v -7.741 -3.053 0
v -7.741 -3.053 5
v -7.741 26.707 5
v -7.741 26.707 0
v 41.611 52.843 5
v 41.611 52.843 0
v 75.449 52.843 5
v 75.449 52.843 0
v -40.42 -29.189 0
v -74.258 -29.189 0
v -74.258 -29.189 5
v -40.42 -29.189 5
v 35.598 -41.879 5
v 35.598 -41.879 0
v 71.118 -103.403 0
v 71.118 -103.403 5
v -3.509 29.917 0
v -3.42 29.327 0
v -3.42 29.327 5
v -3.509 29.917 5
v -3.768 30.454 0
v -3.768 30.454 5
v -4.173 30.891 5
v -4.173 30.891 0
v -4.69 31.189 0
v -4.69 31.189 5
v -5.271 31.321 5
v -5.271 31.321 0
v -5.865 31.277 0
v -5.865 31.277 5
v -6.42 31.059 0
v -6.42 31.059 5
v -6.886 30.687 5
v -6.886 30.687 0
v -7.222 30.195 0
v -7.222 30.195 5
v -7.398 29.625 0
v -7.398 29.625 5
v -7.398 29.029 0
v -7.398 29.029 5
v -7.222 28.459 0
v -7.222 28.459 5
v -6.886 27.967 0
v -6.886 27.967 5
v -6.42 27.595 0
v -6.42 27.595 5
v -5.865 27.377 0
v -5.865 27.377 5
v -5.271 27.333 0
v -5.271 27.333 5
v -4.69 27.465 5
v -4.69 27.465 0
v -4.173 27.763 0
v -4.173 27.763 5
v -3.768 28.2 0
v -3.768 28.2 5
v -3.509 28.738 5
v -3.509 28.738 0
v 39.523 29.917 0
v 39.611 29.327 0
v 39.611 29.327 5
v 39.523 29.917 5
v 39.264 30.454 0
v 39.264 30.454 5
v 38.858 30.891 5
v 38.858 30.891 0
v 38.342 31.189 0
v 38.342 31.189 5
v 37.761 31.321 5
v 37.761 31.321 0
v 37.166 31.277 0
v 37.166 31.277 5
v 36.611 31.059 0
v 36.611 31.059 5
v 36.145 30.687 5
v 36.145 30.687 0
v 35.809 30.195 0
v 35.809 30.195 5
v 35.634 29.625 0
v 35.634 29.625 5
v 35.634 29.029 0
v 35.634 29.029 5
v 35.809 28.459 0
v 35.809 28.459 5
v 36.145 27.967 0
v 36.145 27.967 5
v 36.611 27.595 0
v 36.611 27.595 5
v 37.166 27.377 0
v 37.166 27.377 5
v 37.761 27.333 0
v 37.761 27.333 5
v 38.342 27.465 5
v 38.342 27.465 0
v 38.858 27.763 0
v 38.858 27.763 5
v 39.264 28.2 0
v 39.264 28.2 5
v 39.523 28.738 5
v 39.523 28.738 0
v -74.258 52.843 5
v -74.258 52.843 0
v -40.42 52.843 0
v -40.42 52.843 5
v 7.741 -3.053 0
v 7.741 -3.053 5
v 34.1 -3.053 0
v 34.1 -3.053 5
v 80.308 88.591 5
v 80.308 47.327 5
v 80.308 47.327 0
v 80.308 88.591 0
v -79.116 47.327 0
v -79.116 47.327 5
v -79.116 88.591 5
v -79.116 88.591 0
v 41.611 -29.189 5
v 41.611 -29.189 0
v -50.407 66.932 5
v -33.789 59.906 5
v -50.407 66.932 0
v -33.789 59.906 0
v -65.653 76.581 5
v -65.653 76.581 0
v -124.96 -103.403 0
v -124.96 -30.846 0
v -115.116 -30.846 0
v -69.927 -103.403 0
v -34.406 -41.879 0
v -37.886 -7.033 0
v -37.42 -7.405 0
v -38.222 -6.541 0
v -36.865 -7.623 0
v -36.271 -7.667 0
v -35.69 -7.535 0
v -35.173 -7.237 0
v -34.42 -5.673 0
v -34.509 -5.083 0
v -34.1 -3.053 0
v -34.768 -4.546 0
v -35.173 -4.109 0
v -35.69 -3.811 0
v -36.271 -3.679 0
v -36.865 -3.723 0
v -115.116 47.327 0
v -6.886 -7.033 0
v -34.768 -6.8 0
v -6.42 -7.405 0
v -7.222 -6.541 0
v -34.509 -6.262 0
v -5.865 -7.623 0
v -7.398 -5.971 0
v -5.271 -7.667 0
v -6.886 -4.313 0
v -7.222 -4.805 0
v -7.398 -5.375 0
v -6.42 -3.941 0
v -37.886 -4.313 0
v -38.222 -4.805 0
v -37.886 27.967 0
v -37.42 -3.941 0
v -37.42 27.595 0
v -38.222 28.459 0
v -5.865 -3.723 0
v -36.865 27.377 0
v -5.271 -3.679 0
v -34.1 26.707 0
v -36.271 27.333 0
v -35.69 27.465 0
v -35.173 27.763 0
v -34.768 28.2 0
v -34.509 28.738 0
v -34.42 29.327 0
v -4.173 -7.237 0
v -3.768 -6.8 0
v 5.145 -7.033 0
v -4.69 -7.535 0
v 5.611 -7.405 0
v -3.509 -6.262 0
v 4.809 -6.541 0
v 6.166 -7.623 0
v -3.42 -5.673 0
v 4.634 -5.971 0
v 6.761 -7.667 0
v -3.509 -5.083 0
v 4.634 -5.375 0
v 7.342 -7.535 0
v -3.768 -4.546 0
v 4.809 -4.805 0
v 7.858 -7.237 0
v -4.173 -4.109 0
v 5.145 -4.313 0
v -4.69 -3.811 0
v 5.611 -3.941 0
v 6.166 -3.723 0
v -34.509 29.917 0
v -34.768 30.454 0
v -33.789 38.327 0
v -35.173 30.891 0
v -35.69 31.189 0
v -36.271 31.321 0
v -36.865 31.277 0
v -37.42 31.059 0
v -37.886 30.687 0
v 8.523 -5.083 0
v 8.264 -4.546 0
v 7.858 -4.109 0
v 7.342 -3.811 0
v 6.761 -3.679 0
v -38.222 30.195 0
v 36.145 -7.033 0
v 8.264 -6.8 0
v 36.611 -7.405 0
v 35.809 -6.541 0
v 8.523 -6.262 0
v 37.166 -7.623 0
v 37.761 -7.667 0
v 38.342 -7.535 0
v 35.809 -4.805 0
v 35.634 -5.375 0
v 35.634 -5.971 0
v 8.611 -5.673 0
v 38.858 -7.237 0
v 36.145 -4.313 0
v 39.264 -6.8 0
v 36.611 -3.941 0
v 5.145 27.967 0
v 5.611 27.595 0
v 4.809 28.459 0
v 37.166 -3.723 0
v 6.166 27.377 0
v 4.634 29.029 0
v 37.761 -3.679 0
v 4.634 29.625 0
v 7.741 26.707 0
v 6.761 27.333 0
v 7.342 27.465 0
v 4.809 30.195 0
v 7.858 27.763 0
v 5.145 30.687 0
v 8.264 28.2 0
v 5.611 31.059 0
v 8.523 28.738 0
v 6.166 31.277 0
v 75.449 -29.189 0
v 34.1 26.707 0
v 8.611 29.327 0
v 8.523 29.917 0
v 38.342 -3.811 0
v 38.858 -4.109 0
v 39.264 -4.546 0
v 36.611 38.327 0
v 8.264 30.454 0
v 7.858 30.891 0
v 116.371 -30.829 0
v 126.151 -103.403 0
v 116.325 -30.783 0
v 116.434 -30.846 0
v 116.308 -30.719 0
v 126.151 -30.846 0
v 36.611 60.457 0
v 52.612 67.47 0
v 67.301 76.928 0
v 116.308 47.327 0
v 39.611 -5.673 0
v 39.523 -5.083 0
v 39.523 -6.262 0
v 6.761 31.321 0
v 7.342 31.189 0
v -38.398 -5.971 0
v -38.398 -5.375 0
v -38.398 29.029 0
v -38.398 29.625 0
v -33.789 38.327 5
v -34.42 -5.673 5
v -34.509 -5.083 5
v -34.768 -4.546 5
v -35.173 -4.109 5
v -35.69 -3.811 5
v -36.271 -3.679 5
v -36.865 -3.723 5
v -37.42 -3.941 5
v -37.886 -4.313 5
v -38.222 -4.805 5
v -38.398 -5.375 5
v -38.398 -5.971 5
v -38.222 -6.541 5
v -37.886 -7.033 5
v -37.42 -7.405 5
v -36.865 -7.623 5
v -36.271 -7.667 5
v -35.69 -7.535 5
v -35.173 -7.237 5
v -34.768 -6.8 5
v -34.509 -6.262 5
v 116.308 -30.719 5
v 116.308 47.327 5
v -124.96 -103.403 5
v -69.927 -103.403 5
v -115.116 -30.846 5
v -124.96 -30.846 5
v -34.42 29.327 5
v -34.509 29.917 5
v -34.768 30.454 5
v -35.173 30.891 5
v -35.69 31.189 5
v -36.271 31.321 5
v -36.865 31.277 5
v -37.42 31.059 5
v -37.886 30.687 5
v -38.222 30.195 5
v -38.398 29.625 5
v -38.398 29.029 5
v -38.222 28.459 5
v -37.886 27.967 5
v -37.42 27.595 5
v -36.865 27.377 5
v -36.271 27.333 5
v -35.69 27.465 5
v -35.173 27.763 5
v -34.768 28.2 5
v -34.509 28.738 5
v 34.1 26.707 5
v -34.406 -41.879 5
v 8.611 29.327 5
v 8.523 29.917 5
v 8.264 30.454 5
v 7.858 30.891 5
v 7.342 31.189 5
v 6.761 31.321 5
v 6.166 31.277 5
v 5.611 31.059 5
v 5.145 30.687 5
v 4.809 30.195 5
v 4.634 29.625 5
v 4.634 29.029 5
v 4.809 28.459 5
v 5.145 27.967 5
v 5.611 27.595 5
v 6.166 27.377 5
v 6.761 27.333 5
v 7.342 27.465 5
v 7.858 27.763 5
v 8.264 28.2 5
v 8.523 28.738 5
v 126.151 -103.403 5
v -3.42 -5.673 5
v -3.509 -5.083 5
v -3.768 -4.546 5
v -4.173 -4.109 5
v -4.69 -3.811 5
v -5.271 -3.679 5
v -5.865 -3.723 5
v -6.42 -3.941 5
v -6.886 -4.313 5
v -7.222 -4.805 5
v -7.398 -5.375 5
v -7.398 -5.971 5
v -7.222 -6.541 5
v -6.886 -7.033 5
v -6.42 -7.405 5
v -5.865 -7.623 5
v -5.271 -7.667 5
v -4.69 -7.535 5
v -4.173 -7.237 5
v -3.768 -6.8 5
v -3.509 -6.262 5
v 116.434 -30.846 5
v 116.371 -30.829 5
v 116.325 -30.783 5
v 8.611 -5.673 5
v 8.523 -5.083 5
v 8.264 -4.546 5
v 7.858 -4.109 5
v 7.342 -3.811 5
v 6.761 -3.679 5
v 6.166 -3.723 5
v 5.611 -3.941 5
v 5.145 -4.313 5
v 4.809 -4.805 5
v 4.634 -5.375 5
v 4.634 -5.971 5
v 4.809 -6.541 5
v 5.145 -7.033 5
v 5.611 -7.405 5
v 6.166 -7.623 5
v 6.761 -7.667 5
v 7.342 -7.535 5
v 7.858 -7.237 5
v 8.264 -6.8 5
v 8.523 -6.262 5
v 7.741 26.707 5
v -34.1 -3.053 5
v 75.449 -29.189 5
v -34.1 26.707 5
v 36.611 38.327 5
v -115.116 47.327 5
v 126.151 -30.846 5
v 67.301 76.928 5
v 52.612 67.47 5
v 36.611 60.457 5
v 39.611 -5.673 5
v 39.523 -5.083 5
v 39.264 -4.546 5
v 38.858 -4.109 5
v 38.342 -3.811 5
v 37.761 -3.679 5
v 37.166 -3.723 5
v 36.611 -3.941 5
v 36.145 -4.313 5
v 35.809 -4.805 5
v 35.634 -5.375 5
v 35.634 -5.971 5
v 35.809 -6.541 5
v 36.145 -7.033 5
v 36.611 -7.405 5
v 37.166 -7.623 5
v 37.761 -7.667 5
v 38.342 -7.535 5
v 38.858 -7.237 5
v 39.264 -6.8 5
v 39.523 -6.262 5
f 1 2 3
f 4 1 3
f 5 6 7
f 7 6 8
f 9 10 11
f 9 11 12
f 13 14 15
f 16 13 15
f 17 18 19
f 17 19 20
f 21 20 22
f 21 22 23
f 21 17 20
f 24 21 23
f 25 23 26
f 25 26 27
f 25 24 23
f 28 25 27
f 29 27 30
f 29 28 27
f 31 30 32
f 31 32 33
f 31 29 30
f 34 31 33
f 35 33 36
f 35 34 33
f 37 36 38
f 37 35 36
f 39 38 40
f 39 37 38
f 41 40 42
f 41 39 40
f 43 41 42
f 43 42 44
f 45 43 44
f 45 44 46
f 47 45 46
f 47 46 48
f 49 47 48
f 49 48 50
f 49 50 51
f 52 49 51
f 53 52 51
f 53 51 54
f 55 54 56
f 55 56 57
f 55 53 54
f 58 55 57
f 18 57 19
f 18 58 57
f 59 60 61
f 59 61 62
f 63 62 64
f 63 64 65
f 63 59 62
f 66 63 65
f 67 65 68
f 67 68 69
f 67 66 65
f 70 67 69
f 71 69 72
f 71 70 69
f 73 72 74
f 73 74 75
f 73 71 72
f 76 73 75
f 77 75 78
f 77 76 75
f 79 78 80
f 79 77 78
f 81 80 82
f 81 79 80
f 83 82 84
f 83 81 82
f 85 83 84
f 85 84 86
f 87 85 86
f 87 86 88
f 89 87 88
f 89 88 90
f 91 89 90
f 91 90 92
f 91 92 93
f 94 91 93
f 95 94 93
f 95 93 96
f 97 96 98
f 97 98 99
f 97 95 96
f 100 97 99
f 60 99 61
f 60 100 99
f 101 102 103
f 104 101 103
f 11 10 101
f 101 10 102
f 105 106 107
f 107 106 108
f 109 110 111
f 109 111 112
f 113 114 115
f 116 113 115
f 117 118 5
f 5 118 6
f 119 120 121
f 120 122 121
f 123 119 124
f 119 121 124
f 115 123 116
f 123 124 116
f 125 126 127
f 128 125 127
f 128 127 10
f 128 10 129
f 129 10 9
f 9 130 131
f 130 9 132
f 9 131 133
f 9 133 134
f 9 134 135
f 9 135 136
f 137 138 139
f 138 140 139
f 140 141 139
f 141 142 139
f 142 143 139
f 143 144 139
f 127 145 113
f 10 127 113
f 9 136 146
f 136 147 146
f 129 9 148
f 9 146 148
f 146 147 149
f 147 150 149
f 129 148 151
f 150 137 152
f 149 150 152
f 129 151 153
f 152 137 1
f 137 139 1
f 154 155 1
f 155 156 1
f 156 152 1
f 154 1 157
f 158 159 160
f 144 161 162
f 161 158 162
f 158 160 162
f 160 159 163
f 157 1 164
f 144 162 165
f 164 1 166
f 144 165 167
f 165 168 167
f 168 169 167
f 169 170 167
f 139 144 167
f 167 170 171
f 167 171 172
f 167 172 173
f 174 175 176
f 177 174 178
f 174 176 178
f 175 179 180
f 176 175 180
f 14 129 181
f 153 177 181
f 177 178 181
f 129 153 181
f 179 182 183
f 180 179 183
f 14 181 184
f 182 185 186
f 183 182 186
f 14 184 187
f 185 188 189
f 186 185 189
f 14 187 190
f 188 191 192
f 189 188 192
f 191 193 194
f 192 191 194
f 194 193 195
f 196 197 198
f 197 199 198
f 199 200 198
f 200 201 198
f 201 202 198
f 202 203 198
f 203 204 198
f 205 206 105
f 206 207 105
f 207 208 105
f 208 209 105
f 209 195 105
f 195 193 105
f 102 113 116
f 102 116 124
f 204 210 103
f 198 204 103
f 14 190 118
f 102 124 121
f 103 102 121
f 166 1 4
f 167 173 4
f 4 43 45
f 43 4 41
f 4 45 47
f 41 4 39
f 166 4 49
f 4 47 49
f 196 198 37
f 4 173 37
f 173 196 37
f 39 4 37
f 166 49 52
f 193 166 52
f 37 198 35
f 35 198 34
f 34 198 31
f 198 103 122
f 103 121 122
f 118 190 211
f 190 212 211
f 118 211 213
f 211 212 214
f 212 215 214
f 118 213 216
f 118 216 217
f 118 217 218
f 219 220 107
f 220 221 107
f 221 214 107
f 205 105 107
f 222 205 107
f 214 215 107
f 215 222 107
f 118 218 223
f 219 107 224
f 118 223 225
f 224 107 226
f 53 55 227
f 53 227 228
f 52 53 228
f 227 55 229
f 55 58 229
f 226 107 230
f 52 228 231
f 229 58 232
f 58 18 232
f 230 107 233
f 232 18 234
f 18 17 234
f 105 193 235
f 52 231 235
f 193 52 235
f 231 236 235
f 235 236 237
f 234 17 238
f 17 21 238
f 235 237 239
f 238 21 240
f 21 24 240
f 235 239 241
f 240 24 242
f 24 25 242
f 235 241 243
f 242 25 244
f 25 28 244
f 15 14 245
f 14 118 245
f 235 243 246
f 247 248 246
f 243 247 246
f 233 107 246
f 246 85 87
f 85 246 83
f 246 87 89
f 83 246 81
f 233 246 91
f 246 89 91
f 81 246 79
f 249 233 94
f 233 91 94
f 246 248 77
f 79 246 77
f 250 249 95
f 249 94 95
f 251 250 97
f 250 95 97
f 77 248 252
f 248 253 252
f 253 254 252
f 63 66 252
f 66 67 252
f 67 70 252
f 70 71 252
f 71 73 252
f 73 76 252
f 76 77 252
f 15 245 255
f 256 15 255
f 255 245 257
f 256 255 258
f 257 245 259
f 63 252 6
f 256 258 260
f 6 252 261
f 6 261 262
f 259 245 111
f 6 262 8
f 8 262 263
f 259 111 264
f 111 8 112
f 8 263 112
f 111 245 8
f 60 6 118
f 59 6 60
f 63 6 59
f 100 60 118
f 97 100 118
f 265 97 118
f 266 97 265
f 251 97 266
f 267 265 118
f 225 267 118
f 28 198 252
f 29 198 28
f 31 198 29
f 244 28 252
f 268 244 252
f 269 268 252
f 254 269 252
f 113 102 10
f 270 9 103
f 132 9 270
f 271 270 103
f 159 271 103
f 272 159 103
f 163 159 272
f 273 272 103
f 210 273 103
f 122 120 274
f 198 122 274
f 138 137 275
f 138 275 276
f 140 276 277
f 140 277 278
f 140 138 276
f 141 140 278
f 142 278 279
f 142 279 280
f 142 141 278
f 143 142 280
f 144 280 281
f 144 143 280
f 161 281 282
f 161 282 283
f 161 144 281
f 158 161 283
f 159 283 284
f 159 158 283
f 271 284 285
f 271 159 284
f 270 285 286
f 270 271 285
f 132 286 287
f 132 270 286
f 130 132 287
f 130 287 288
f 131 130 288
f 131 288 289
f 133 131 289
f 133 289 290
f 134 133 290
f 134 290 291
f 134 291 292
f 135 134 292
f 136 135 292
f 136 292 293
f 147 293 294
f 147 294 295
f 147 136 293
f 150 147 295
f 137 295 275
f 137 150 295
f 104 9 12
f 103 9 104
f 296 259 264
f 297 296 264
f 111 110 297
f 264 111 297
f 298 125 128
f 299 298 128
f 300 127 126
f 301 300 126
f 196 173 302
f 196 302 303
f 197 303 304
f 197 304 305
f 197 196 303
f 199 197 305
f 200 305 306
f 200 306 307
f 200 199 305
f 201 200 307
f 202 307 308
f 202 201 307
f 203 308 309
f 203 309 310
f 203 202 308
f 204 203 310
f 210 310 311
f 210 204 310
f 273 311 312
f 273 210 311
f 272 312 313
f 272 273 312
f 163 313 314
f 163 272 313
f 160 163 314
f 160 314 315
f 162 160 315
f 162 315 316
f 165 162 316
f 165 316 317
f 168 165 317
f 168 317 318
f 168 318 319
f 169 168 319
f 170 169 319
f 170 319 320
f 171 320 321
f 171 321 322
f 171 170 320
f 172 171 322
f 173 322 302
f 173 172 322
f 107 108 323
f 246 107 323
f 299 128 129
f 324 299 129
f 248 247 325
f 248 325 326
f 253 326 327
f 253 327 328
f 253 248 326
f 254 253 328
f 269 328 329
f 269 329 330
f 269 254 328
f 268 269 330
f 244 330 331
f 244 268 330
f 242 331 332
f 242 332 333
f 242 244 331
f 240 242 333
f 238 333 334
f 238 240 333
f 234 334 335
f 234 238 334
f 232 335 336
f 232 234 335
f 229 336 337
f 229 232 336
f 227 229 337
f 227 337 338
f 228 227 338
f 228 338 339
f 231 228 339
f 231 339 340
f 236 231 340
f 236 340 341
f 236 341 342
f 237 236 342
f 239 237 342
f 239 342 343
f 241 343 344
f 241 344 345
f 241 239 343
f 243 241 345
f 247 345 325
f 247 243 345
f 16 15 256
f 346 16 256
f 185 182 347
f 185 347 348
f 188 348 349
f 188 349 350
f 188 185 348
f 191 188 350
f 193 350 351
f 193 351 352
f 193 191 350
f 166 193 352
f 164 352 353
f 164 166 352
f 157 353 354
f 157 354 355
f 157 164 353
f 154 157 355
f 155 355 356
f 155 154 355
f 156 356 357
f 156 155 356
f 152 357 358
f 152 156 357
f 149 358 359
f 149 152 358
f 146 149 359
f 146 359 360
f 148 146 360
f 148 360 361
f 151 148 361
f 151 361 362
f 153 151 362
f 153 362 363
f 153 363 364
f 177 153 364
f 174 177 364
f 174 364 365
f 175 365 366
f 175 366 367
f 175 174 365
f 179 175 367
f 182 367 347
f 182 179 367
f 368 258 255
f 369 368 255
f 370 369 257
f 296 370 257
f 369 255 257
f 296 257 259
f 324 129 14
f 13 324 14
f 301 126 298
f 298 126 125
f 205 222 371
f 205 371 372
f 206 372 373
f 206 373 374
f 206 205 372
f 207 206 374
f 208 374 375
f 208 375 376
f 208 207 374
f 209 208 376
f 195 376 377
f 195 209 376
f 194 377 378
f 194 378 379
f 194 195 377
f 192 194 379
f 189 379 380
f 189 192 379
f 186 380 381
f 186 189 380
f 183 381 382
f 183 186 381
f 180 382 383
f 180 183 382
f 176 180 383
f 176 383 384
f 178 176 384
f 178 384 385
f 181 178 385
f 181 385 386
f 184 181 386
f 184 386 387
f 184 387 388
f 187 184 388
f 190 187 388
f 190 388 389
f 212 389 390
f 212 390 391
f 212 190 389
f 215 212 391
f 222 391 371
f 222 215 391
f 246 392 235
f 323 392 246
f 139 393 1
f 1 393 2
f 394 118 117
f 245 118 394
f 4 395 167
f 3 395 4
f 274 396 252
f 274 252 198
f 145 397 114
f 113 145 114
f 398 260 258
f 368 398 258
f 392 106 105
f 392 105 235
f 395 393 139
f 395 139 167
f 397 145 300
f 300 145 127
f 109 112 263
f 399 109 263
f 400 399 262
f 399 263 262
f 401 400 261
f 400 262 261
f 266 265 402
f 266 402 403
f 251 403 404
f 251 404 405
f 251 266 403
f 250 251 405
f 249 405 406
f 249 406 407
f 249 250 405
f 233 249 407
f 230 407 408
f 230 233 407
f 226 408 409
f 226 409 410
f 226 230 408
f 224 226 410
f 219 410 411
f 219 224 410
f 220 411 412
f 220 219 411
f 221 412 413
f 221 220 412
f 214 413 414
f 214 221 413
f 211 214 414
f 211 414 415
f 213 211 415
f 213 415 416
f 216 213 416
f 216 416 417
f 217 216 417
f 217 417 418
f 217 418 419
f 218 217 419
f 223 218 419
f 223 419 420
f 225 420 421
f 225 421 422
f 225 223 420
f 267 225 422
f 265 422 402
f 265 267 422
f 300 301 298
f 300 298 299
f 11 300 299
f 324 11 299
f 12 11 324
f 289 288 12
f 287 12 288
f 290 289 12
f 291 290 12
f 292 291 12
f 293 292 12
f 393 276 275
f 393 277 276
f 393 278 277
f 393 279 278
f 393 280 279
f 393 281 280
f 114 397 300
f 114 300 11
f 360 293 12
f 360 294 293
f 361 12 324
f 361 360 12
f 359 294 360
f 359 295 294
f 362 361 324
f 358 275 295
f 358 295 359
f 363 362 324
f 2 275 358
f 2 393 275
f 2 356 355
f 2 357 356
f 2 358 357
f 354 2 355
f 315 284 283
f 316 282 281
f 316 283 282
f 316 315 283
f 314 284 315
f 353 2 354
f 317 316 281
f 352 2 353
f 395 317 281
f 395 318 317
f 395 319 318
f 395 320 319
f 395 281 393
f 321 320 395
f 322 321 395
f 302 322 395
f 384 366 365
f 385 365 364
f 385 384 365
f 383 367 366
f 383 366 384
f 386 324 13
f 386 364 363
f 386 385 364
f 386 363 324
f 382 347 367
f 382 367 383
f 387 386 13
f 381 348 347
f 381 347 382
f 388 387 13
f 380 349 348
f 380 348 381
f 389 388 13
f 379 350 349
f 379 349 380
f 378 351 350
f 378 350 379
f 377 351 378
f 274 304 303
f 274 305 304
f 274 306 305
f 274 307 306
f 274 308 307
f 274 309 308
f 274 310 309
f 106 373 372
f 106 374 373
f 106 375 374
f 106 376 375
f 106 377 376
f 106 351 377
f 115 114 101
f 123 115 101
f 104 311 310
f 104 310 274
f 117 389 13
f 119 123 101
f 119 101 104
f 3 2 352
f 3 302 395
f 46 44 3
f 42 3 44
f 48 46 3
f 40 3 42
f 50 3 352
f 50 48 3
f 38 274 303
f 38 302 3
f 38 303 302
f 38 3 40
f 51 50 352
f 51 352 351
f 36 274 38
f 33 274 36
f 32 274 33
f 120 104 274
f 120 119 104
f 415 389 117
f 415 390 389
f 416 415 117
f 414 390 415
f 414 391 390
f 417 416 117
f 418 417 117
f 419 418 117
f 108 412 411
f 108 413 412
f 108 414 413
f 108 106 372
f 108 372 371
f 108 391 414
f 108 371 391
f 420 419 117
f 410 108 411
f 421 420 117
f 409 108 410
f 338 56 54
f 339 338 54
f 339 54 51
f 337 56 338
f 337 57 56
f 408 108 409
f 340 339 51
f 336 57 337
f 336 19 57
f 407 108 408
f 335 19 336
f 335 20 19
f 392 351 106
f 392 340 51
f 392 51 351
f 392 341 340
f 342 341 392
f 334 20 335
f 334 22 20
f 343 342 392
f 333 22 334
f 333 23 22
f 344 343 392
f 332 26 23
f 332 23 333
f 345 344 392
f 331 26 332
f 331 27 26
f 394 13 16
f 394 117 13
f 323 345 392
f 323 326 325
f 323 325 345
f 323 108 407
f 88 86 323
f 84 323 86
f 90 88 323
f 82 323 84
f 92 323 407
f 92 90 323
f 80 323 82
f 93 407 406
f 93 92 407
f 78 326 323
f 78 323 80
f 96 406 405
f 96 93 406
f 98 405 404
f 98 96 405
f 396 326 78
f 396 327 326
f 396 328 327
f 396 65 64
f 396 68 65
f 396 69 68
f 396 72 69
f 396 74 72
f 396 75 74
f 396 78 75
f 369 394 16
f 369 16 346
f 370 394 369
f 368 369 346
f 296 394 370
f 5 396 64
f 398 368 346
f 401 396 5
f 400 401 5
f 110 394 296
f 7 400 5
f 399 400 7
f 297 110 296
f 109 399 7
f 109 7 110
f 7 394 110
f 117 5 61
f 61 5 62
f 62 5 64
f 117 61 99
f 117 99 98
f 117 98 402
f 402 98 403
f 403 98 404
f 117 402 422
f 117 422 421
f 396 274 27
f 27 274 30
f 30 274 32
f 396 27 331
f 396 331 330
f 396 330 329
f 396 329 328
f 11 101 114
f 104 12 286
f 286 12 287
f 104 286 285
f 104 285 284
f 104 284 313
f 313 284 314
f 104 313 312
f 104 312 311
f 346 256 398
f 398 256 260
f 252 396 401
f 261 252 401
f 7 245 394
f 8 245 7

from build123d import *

# Parameters (mm, degrees)
SKETCH1_R           = 2
SKETCH1_W           = 33.838048367
SKETCH1_H           = 82.031632405
BOSS_EXTRUDE1_DEPTH = 5
SKETCH6_W           = 26.358753283
SKETCH6_H           = 29.759882739
CUT_EXTRUDE5_DEPTH  = 10
CUT_EXTRUDE7_DEPTH  = 10
SKETCH8_R           = 110
CUT_EXTRUDE8_DEPTH  = 10
SKETCH9_W           = 34.735720487
SKETCH9_H           = 8.029761027
BOSS_EXTRUDE2_DEPTH = 5
SKETCH10_W          = 47.255249557
SKETCH10_H          = 69.524861462
SKETCH10_W_2        = 47.255249556
CUT_EXTRUDE9_DEPTH  = 10


with BuildPart() as part:
    # Sketch1 → Boss-Extrude1 (new body)
    with BuildSketch(Plane.XY):
        with BuildLine():
            Line((-67.377293169, 102.297329585), (-124.936746461, 102.297329585))
            Line((-124.936746461, 102.297329585), (-124.953483971, 82.555494847))
            Line((-124.953483971, 82.555494847), (-124.958588565, 69.121872443))
            Line((-124.958588565, 69.121872443), (-124.95889847, 54.500614803))
            Line((-124.95889847, 54.500614803), (-115.116370276, 54.500614803))
            Line((-115.116370276, 54.500614803), (-115.116370276, -30.846433579))
            Line((-115.116370276, -30.846433579), (-124.960166164, -30.846433579))
            Line((-124.960166164, -30.846433579), (-124.960166164, -103.402915432))
            Line((-124.960166164, -103.402915432), (-69.927203874, -103.402915432))
            Line((-69.927203874, -103.402915432), (-34.406465086, -41.879191129))
            Line((-34.406465086, -41.879191129), (35.597608304, -41.879191129))
            Line((35.597608304, -41.879191129), (71.118347092, -103.402915432))
            Line((71.118347092, -103.402915432), (126.151309382, -103.402915432))
            Line((126.151309382, -103.402915432), (126.151309382, -30.846433579))
            Line((126.151309382, -30.846433579), (116.434490518, -30.846433579))
            ThreePointArc((116.434490518, -30.846433579), (116.344704203, -30.80924287), (116.307513493, -30.719456554))
            Line((116.307513493, -30.719456554), (116.307513493, 54.373637777))
            ThreePointArc((116.307513493, 54.373637777), (116.344704203, 54.463424093), (116.434490518, 54.500614803))
            Line((116.434490518, 54.500614803), (126.150041687, 54.500614803))
            Line((126.150041687, 54.500614803), (126.149731996, 69.11181019))
            Line((126.149731996, 69.11181019), (126.144618663, 82.565551548))
            Line((126.144618663, 82.565551548), (126.127889679, 102.297329585))
            Line((126.127889679, 102.297329585), (68.568436387, 102.297329585))
            ThreePointArc((68.568436387, 102.297329585), (0.595571609, 72.327090612), (-67.377293169, 102.297329585))
        make_face()
        with Locations((-5.420244594, -5.672909388)):
            Circle(SKETCH1_R, mode=Mode.SUBTRACT)
        with Locations((-36.420244594, -5.672909388)):
            Circle(SKETCH1_R, mode=Mode.SUBTRACT)
        with Locations((-36.420244594, 29.327090612)):
            Circle(SKETCH1_R, mode=Mode.SUBTRACT)
        with Locations((-5.420244594, 29.327090612)):
            Circle(SKETCH1_R, mode=Mode.SUBTRACT)
        with Locations((6.611387811, 29.327090612)):
            Circle(SKETCH1_R, mode=Mode.SUBTRACT)
        with Locations((6.611387811, -5.672909388)):
            Circle(SKETCH1_R, mode=Mode.SUBTRACT)
        with Locations((37.611387811, -5.672909388)):
            Circle(SKETCH1_R, mode=Mode.SUBTRACT)
        with Locations((37.611387811, 29.327090612)):
            Circle(SKETCH1_R, mode=Mode.SUBTRACT)
        with Locations((58.530411994, 11.827090612)):
            Rectangle(SKETCH1_W, SKETCH1_H, mode=Mode.SUBTRACT)
        with Locations((-57.339268778, 11.827090612)):
            Rectangle(SKETCH1_W, SKETCH1_H, mode=Mode.SUBTRACT)
    extrude(amount=BOSS_EXTRUDE1_DEPTH)

    # Sketch6 → Cut-Extrude5 (cut)
    with BuildSketch(Plane.XY.offset(5)):
        with Locations((-20.920244594, 11.827090611)):
            Rectangle(SKETCH6_W, SKETCH6_H)
        with Locations((20.920244594, 11.827090611)):
            Rectangle(SKETCH6_W, SKETCH6_H)
    extrude(amount=-CUT_EXTRUDE5_DEPTH, mode=Mode.SUBTRACT)

    # Sketch7 → Cut-Extrude7 (cut)
    with BuildSketch(Plane.XY.offset(5)):
        Polygon((36.611387811, 79.275951145), (36.611387811, 38.327090612), (-33.788939324, 38.327090612), (-33.788939324, 77.421207896), (-33.788939324, 95.121170758), (36.611387811, 95.121170758), align=None)
    extrude(amount=-CUT_EXTRUDE7_DEPTH, mode=Mode.SUBTRACT)

    # Sketch8 → Cut-Extrude8 (cut)
    with BuildSketch(Plane(origin=(0, 0, 0), x_dir=(-1, 0, 0), z_dir=(0, 0, -1))):
        with Locations((-0.595571609, 164.393850159)):
            Circle(SKETCH8_R)
    extrude(amount=-CUT_EXTRUDE8_DEPTH, mode=Mode.SUBTRACT)

    # Sketch9 → Boss-Extrude2 (add)
    with BuildSketch(Plane.XY.offset(5)):
        with Locations((-107.568886218, 106.312210099)):
            Rectangle(SKETCH9_W, SKETCH9_H)
        with Locations((108.760029436, 106.312210099)):
            Rectangle(SKETCH9_W, SKETCH9_H)
    extrude(amount=-BOSS_EXTRUDE2_DEPTH)

    # Sketch10 → Cut-Extrude9 (cut)
    with BuildSketch(Plane.XY.offset(5)):
        with Locations((103.935138271, 82.089521343)):
            Rectangle(SKETCH10_W, SKETCH10_H)
        with Locations((-102.743995054, 82.089521343)):
            Rectangle(SKETCH10_W_2, SKETCH10_H)
    extrude(amount=-CUT_EXTRUDE9_DEPTH, mode=Mode.SUBTRACT)


solid = part.part
